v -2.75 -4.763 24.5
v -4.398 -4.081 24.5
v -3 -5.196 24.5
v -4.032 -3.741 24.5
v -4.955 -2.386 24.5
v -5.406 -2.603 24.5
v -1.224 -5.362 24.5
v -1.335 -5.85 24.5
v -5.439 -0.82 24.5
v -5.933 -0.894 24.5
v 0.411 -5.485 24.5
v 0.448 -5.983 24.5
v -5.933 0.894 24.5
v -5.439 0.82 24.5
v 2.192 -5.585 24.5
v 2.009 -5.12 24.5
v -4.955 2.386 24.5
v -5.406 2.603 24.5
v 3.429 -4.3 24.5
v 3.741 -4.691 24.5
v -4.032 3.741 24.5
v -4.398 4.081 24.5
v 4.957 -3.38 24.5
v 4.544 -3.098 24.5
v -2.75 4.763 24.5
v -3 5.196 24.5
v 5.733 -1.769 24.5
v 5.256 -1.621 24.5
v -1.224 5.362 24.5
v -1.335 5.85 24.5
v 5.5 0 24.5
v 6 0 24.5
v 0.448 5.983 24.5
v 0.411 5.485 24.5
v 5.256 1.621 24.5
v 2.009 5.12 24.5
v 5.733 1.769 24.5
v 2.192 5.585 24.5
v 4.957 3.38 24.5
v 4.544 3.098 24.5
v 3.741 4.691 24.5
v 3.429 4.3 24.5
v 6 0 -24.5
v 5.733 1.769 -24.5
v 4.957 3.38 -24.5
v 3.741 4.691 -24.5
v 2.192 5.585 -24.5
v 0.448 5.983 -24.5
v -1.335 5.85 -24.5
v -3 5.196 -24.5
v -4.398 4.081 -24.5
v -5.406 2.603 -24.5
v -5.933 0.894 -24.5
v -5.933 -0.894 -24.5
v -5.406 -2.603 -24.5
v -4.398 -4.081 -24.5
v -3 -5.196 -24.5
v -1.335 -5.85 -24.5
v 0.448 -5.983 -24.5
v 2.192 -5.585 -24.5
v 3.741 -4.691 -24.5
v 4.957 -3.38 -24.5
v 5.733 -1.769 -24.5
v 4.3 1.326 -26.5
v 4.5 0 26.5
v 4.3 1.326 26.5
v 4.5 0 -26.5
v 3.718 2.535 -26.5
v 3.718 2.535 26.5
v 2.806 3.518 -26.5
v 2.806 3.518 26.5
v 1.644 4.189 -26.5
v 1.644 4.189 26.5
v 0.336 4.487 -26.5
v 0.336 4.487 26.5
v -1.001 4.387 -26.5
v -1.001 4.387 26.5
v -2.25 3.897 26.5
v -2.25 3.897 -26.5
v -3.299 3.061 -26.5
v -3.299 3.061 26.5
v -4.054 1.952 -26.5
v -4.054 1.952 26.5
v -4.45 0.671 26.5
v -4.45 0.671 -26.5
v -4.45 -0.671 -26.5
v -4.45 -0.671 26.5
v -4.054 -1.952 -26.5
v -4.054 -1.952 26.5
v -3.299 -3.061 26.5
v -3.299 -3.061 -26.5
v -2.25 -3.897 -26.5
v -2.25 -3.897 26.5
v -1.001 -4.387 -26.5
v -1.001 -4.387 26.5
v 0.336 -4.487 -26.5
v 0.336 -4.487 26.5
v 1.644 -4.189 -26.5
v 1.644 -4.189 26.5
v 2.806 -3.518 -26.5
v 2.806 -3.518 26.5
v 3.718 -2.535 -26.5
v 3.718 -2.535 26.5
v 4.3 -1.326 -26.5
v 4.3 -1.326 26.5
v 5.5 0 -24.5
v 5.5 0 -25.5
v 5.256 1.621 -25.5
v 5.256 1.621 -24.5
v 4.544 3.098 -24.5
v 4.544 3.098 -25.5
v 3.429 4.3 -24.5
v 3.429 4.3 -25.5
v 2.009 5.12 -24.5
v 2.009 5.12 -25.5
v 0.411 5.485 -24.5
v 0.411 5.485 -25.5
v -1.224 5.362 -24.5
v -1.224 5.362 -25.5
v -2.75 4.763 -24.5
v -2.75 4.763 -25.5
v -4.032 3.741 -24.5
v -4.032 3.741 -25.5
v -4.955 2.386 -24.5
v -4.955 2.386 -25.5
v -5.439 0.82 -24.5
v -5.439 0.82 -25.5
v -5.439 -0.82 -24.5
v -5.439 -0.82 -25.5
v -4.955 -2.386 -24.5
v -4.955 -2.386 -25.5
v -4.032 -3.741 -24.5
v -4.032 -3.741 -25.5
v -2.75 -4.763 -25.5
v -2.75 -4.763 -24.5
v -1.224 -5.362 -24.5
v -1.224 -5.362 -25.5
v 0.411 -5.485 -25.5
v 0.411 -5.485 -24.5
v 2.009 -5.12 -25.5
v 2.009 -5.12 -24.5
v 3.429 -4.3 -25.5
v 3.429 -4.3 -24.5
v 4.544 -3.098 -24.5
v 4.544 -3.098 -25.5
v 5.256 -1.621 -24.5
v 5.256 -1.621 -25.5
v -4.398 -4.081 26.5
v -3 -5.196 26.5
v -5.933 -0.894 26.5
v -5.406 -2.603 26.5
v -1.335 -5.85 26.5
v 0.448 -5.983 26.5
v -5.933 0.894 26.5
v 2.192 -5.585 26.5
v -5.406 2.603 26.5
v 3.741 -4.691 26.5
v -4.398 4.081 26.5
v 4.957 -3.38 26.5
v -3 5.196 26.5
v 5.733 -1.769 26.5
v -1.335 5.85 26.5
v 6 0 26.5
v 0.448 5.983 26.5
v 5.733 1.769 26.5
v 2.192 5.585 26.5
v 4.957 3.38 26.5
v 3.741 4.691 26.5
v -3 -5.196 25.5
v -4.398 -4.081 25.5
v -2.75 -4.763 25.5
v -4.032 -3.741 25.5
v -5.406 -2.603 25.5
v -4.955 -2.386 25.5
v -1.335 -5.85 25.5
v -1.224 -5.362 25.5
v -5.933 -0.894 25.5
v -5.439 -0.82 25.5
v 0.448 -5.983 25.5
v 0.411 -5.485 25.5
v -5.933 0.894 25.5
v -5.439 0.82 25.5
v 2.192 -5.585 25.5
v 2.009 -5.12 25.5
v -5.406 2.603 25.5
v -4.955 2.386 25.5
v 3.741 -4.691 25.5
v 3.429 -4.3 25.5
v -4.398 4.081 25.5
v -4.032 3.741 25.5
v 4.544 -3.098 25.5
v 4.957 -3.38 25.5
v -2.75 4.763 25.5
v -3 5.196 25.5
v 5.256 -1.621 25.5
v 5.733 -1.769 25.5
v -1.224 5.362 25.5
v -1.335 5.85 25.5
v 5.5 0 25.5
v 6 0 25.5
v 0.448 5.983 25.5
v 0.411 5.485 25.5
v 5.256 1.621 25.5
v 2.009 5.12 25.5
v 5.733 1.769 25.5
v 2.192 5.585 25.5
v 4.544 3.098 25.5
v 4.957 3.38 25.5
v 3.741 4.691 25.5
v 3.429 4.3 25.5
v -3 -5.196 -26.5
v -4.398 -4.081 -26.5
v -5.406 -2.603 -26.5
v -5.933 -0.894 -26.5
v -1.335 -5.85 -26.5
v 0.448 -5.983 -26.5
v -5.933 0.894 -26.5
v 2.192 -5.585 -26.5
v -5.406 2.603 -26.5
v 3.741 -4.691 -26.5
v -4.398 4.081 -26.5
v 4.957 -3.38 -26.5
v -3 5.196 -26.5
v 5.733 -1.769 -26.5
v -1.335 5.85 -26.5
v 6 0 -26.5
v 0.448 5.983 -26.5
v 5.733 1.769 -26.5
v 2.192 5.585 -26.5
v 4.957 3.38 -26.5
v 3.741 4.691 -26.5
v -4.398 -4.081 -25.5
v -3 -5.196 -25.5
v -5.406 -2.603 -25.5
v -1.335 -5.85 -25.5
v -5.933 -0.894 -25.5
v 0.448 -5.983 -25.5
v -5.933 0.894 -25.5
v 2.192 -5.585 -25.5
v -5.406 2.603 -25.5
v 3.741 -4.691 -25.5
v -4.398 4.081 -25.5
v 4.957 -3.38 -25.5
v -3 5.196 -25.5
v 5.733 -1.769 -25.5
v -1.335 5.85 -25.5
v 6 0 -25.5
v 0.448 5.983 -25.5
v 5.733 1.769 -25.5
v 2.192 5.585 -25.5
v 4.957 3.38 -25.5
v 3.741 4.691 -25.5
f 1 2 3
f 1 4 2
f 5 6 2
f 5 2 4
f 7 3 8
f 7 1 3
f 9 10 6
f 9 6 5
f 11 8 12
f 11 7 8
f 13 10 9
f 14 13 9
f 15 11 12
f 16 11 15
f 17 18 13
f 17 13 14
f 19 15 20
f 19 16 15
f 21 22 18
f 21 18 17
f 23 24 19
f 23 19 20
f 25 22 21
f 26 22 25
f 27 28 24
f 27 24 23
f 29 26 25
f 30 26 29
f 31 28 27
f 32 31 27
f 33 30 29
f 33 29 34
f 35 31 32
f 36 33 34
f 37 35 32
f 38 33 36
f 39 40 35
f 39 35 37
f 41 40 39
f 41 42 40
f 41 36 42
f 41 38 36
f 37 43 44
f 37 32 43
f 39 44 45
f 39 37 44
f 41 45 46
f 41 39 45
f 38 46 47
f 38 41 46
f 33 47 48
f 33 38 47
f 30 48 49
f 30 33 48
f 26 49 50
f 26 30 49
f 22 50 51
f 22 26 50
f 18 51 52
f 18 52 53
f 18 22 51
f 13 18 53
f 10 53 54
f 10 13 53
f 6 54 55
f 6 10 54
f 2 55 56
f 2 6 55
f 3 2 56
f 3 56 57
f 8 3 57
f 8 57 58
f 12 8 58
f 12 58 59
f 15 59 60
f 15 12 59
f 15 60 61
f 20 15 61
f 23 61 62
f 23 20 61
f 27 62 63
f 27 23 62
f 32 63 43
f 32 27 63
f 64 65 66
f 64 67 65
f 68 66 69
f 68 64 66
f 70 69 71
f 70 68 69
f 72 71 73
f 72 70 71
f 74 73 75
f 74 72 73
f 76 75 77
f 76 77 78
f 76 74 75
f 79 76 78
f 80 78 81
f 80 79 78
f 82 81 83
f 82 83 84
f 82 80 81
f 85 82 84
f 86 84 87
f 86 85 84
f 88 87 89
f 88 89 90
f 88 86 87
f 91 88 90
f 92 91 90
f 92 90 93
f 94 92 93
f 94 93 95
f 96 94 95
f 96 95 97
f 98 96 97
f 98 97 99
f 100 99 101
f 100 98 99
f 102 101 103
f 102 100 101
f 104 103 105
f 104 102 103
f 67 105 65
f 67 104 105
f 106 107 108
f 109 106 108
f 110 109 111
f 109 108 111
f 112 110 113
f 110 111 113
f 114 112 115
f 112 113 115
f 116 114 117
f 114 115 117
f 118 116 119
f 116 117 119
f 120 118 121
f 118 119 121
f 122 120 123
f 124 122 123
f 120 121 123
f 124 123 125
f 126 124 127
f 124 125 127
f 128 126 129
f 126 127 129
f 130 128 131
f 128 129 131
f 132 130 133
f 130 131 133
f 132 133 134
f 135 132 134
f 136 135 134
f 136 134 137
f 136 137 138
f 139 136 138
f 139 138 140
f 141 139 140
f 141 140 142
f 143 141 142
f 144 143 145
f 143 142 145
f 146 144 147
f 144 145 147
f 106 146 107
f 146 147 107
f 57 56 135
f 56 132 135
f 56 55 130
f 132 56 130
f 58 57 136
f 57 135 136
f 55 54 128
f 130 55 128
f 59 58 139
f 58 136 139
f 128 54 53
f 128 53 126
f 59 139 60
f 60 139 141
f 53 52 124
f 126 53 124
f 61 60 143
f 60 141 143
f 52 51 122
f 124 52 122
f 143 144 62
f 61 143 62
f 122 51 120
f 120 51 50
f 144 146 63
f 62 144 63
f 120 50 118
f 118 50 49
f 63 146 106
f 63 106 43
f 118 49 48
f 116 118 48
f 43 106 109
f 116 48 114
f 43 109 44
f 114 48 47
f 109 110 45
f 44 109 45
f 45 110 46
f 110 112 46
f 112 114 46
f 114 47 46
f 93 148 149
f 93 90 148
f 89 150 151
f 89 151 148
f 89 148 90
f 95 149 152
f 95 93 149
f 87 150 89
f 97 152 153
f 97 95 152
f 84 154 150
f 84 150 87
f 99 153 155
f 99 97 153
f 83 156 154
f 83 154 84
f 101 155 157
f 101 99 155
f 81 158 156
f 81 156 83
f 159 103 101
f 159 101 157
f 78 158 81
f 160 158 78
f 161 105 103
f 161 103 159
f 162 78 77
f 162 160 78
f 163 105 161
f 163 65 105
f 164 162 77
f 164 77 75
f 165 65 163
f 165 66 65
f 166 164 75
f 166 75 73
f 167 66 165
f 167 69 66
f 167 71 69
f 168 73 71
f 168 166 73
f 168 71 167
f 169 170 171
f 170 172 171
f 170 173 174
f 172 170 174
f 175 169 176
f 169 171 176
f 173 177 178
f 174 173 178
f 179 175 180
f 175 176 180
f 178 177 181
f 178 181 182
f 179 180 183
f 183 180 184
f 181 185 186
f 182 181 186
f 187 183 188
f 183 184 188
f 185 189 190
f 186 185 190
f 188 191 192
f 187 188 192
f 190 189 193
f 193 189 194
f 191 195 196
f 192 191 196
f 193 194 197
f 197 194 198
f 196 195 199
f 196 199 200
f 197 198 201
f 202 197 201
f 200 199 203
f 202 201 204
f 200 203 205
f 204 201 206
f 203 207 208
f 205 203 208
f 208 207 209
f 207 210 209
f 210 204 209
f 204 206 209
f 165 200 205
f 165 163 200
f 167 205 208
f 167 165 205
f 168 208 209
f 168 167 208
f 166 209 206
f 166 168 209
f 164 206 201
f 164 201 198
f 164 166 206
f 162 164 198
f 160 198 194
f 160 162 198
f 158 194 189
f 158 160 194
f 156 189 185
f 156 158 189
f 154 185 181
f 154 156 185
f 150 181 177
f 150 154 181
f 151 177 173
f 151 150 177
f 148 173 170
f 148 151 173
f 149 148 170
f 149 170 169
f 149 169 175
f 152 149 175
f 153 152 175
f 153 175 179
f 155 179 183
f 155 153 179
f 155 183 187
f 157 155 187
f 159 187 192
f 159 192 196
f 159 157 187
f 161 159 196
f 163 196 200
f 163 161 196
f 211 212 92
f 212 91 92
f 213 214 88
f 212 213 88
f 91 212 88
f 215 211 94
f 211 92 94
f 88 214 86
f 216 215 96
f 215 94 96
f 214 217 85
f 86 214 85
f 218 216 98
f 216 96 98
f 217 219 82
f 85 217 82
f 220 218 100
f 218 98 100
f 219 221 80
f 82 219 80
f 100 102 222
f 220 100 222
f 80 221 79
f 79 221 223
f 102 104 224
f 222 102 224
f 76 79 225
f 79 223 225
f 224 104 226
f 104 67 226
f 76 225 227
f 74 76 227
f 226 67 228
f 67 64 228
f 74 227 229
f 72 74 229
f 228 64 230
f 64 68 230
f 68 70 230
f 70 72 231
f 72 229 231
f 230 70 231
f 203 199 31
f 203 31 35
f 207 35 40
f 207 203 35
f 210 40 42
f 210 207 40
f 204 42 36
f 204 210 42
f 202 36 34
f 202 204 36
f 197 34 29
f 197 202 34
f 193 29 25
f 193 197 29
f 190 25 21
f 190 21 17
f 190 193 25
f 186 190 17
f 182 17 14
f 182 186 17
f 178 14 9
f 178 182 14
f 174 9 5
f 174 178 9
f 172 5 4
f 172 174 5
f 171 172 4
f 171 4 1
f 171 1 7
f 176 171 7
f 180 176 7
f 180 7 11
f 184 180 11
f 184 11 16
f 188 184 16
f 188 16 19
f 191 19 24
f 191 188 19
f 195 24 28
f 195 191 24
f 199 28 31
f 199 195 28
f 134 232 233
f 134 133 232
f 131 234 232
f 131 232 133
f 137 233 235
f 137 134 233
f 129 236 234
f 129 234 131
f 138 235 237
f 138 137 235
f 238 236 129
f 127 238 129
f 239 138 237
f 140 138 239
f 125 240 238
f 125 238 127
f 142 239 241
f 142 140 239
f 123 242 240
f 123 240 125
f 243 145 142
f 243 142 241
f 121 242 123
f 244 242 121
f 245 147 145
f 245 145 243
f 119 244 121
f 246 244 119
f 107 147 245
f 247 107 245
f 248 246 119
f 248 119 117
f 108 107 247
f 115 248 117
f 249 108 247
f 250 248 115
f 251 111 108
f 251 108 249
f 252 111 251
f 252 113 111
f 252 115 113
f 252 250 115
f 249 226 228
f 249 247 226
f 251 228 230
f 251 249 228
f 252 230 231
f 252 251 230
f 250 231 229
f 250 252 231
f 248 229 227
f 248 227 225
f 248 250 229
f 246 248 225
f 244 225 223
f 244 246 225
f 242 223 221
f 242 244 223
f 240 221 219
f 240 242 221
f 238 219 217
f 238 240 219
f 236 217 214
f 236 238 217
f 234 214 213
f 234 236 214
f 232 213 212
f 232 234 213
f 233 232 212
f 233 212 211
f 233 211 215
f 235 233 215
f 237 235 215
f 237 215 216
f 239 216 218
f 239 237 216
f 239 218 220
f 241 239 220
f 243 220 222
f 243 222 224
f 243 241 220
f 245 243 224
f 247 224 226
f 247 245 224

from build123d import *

# Parameters (mm, degrees)
SKETCH_1_R          = 6
SKETCH_1_R_2        = 4.5
EXTRUDE_1_DEPTH     = 26.5
CUT_EXTRUDE_START   = -1
SKETCH_2_R          = 6
SKETCH_2_R_2        = 5.5
CUT_EXTRUDE_1_DEPTH = 1


with BuildPart() as part:
    # Эскиз1 → Бобышка-Вытянуть1 (new body, symmetric)
    with BuildSketch(Plane.XY):
        Circle(SKETCH_1_R)
        Circle(SKETCH_1_R_2, mode=Mode.SUBTRACT)
    extrude(amount=EXTRUDE_1_DEPTH, both=True)

    # Эскиз2 → Вырез-Вытянуть1 (cut)
    with BuildSketch(Plane.XY.offset(26.5).offset(CUT_EXTRUDE_START)):
        Circle(SKETCH_2_R)
        Circle(SKETCH_2_R_2, mode=Mode.SUBTRACT)
    cut_extrude_1 = extrude(amount=-CUT_EXTRUDE_1_DEPTH, mode=Mode.SUBTRACT)

    # Зеркальное отражение1: Вырез-Вытянуть1 across plane
    add(cut_extrude_1.mirror(Plane.XY), mode=Mode.SUBTRACT)


solid = part.part
